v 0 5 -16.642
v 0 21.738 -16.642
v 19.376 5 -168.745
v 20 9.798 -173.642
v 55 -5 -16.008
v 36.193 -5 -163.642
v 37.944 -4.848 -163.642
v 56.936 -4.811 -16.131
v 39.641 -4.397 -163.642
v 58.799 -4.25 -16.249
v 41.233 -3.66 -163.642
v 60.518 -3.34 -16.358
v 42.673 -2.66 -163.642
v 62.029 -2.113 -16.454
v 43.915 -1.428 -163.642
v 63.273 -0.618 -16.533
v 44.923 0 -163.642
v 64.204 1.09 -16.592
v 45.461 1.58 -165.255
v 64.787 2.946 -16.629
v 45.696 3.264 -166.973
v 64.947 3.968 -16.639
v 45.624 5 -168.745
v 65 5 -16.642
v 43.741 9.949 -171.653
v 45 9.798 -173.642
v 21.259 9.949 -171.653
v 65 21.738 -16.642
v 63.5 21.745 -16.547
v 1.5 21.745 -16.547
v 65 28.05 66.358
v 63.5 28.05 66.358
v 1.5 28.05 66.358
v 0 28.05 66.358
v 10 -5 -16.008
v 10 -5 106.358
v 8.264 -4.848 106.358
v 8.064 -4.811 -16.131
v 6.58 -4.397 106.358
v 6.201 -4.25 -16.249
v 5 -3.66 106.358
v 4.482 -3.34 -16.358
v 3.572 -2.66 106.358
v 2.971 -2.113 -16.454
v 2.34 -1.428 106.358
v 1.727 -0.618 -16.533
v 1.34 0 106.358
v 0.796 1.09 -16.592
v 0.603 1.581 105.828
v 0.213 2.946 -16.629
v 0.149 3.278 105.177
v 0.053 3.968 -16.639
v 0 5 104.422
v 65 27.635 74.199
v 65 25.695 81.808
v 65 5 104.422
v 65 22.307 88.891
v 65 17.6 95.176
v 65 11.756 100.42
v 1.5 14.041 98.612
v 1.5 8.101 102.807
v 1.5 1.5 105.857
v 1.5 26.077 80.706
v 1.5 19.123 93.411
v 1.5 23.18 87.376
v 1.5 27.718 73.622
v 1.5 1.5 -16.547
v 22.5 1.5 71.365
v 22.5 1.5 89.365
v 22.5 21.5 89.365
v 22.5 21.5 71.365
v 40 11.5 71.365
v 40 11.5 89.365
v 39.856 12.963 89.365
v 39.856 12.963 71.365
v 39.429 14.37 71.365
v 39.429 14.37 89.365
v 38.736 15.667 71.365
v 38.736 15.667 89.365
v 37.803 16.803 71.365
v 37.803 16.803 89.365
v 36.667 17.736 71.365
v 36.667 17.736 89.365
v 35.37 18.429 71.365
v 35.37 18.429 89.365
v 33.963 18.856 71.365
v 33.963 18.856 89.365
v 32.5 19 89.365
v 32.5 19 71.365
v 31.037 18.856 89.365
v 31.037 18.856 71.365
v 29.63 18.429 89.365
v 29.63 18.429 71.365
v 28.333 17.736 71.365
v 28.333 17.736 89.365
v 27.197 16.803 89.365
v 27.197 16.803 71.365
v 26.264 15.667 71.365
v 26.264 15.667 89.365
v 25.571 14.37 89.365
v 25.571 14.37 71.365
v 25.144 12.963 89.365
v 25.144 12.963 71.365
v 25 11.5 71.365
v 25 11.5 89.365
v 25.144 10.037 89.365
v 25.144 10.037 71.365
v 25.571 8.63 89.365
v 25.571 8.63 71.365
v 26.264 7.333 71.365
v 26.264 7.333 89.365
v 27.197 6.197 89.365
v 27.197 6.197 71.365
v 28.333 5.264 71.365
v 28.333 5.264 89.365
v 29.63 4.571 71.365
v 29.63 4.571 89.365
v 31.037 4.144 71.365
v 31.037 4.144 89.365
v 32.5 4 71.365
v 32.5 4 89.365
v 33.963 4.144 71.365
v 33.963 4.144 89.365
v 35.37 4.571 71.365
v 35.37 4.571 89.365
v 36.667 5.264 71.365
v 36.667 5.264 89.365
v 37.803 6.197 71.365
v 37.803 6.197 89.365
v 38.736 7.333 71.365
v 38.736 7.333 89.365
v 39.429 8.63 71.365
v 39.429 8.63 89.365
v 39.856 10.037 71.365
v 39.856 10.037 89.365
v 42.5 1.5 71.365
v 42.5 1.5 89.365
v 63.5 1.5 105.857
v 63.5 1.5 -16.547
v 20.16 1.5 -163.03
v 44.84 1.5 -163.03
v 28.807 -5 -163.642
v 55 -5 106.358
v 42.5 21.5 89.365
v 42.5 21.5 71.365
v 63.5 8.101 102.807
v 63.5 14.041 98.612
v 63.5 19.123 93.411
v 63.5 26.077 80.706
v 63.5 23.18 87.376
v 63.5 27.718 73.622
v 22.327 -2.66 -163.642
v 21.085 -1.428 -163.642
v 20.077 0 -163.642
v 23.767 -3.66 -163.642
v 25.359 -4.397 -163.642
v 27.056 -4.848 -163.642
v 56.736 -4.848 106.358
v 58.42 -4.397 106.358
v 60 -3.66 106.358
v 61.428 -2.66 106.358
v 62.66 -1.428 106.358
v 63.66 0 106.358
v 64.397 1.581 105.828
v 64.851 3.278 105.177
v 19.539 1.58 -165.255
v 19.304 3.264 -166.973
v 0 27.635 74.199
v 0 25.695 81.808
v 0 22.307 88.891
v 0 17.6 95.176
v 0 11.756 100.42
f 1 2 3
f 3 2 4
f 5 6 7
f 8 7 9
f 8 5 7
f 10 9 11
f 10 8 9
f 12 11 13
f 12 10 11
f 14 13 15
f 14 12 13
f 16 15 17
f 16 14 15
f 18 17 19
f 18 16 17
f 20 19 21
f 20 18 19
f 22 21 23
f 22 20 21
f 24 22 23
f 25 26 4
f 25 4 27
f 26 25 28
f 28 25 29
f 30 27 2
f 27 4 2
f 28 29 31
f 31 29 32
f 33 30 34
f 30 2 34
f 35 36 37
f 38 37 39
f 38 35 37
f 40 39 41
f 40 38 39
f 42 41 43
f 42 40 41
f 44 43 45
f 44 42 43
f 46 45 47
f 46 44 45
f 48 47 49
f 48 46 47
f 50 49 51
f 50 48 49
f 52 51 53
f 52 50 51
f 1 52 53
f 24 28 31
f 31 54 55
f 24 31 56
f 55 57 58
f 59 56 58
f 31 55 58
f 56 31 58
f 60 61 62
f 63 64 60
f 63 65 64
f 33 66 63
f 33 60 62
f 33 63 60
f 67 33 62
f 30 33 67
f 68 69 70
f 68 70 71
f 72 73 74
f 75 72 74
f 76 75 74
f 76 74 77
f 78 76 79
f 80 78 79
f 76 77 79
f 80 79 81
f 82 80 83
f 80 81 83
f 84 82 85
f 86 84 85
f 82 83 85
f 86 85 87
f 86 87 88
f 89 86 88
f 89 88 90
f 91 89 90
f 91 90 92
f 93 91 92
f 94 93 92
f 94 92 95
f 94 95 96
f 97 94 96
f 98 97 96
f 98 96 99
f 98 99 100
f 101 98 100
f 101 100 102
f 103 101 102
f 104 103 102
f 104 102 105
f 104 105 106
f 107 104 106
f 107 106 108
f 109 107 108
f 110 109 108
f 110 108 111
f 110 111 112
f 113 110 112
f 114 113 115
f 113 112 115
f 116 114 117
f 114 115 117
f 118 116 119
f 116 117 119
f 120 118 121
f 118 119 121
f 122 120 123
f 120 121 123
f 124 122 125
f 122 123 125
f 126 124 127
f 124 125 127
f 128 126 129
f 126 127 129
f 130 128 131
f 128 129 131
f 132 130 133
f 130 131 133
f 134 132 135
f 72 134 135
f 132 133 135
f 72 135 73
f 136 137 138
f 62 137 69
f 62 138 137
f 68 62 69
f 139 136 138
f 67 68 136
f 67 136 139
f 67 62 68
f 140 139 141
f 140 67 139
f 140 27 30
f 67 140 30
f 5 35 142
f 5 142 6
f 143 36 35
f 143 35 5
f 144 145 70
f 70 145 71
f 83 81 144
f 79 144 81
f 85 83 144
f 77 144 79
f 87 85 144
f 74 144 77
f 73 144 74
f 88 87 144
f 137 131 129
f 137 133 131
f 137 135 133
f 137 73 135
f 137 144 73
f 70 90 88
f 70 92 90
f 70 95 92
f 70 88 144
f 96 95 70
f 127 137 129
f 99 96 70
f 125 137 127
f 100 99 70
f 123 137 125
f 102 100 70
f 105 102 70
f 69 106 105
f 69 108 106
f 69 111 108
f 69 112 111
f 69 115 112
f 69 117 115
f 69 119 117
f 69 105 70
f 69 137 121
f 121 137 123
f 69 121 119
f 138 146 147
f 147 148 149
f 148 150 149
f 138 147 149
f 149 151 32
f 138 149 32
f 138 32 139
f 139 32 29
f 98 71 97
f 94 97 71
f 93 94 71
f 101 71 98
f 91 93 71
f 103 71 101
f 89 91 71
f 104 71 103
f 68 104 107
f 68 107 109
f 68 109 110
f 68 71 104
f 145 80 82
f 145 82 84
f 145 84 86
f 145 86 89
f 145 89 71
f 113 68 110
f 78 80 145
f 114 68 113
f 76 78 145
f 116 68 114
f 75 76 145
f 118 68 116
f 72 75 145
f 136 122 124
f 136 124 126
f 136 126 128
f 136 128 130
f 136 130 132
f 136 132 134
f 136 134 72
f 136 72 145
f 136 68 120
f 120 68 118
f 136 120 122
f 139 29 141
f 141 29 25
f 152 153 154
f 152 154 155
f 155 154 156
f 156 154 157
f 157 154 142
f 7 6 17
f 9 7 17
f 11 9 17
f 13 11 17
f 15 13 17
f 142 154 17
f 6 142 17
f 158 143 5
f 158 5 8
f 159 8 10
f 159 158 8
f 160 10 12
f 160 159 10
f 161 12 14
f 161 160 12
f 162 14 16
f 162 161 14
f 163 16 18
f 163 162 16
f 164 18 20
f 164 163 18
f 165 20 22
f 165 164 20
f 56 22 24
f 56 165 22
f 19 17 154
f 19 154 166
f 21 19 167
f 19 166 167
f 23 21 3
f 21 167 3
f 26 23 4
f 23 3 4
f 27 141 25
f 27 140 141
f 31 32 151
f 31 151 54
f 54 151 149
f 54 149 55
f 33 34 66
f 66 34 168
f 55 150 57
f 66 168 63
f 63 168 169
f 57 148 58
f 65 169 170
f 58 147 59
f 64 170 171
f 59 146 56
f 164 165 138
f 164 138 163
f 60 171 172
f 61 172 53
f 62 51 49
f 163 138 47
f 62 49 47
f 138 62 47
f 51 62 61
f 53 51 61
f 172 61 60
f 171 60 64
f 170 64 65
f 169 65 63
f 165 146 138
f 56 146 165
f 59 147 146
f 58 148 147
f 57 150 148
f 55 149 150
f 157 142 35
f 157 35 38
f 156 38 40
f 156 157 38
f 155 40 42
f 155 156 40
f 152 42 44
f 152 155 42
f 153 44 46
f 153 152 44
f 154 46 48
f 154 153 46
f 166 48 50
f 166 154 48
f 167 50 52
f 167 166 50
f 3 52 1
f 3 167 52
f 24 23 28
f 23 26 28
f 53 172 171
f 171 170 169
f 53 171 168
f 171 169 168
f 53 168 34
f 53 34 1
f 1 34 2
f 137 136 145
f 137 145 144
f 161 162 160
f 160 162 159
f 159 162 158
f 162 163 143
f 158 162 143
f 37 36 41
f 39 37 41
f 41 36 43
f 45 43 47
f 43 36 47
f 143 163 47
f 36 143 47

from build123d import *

# Parameters (mm, degrees)
BOSS_EXTRUDE1_DEPTH     = 65
CUT_EXTRUDE1_DEPTH      = 188.52539512587924
CUT_EXTRUDE1_DEPTH_BACK = 188.52539512587924
CUT_EXTRUDE2_DEPTH      = 188.52539512587933
CUT_EXTRUDE2_DEPTH_BACK = 188.52539512587933
SHELL2_T                = -1.5
BOSS_EXTRUDE2_DEPTH     = 20
SKETCH8_R               = 7.5
CUT_EXTRUDE3_DEPTH      = 20
BOSS_EXTRUDE4_DEPTH     = 5
FILLET12_R              = 10


with BuildPart() as part:
    # Sketch1 → Boss-Extrude1 (new body)
    with BuildSketch(Plane(origin=(0, 0, 0), x_dir=(0, 0, -1), z_dir=(1, 0, 0))):
        with BuildLine():
            Line((-106.35767816643843, 0), (163.6423218335616, 0))
            Line((163.6423218335616, 0), (173.6423218335616, 9.7979589711327))
            Line((173.6423218335616, 9.7979589711327), (-66.35767816643839, 28.050095))
            ThreePointArc((-66.35767816643839, 28.050095), (-91.13754828258394, 20.841238484230953), (-106.35767816643843, 0))
        make_face()
    extrude(amount=BOSS_EXTRUDE1_DEPTH)

    # Sketch3 → Cut-Extrude1 (cut, two sides: drawn at the far end of the back side and taken through both)
    with BuildSketch(Plane.XZ.offset(-CUT_EXTRUDE1_DEPTH_BACK)):
        Polygon((-72.93745664211396, 555.916712807033), (0, -16.642321833561624), (19.999999999999996, -173.6423218335616), (92.93745664211396, -746.2013564741562), (-1052.1806126390752, -892.0762697583841), (-1218.0555259233033, 410.04179952280515), align=None)
    extrude(amount=CUT_EXTRUDE1_DEPTH + CUT_EXTRUDE1_DEPTH_BACK, mode=Mode.SUBTRACT)

    # Sketch5 → Cut-Extrude2 (cut, two sides: drawn at the far end of the back side and taken through both)
    with BuildSketch(Plane.XZ.offset(-CUT_EXTRUDE2_DEPTH_BACK)):
        Polygon((137.93745664211394, 555.916712807033), (65, -16.64232183356158), (45, -173.6423218335616), (-27.937456642113958, -746.2013564741562), (1117.1806126390752, -892.0762697583841), (1283.0555259233033, 410.04179952280515), align=None)
    extrude(amount=CUT_EXTRUDE2_DEPTH + CUT_EXTRUDE2_DEPTH_BACK, mode=Mode.SUBTRACT)

    # Shell2
    shell2_openings = [part.faces().sort_by_distance(p)[0] for p in [
        (32.5, 20.220874291, -36.589887377),
        (32.5, 20.841238484, 91.137548283),
    ]]
    offset(amount=SHELL2_T, openings=shell2_openings, kind=Kind.INTERSECTION)

    # Sketch7 → Boss-Extrude2 (add)
    with BuildSketch(Plane(origin=(0, 1.5, 0), x_dir=(1, 0, 0), z_dir=(0, 1, 0))):
        Polygon((22.499999999999993, -71.3649853274635), (42.49999999999999, -71.3649853274635), (42.5, -89.36498532746351), (22.499999999999996, -89.36498532746351), align=None)
    extrude(amount=BOSS_EXTRUDE2_DEPTH)

    # Sketch8 → Cut-Extrude3 (cut)
    with BuildSketch(Plane.XY.offset(89.36498532746351)):
        with Locations((32.49999999999999, 11.500000000000002)):
            Circle(SKETCH8_R)
    extrude(amount=-CUT_EXTRUDE3_DEPTH, mode=Mode.SUBTRACT)

    # Sketch18 → Boss-Extrude4 (add)
    with BuildSketch(Plane.XZ):
        Polygon((65, 106.35767816643843), (0, 106.35767816643843), (0, -16.642321833561624), (18.726114649681534, -163.6423218335616), (46.27388535031847, -163.6423218335616), (65, -16.64232183356158), align=None)
    extrude(amount=BOSS_EXTRUDE4_DEPTH)

    # Fillet12
    fillet12_edges = [part.edges().sort_by_distance(p)[0] for p in [
        (65, -5, 44.857678166438426),
        (0, -5, 44.857678166438404),
        (9.363057324840767, -5, -90.14232183356161),
        (55.63694267515924, -5, -90.1423218335616),
    ]]
    fillet(fillet12_edges, radius=FILLET12_R)


solid = part.part
